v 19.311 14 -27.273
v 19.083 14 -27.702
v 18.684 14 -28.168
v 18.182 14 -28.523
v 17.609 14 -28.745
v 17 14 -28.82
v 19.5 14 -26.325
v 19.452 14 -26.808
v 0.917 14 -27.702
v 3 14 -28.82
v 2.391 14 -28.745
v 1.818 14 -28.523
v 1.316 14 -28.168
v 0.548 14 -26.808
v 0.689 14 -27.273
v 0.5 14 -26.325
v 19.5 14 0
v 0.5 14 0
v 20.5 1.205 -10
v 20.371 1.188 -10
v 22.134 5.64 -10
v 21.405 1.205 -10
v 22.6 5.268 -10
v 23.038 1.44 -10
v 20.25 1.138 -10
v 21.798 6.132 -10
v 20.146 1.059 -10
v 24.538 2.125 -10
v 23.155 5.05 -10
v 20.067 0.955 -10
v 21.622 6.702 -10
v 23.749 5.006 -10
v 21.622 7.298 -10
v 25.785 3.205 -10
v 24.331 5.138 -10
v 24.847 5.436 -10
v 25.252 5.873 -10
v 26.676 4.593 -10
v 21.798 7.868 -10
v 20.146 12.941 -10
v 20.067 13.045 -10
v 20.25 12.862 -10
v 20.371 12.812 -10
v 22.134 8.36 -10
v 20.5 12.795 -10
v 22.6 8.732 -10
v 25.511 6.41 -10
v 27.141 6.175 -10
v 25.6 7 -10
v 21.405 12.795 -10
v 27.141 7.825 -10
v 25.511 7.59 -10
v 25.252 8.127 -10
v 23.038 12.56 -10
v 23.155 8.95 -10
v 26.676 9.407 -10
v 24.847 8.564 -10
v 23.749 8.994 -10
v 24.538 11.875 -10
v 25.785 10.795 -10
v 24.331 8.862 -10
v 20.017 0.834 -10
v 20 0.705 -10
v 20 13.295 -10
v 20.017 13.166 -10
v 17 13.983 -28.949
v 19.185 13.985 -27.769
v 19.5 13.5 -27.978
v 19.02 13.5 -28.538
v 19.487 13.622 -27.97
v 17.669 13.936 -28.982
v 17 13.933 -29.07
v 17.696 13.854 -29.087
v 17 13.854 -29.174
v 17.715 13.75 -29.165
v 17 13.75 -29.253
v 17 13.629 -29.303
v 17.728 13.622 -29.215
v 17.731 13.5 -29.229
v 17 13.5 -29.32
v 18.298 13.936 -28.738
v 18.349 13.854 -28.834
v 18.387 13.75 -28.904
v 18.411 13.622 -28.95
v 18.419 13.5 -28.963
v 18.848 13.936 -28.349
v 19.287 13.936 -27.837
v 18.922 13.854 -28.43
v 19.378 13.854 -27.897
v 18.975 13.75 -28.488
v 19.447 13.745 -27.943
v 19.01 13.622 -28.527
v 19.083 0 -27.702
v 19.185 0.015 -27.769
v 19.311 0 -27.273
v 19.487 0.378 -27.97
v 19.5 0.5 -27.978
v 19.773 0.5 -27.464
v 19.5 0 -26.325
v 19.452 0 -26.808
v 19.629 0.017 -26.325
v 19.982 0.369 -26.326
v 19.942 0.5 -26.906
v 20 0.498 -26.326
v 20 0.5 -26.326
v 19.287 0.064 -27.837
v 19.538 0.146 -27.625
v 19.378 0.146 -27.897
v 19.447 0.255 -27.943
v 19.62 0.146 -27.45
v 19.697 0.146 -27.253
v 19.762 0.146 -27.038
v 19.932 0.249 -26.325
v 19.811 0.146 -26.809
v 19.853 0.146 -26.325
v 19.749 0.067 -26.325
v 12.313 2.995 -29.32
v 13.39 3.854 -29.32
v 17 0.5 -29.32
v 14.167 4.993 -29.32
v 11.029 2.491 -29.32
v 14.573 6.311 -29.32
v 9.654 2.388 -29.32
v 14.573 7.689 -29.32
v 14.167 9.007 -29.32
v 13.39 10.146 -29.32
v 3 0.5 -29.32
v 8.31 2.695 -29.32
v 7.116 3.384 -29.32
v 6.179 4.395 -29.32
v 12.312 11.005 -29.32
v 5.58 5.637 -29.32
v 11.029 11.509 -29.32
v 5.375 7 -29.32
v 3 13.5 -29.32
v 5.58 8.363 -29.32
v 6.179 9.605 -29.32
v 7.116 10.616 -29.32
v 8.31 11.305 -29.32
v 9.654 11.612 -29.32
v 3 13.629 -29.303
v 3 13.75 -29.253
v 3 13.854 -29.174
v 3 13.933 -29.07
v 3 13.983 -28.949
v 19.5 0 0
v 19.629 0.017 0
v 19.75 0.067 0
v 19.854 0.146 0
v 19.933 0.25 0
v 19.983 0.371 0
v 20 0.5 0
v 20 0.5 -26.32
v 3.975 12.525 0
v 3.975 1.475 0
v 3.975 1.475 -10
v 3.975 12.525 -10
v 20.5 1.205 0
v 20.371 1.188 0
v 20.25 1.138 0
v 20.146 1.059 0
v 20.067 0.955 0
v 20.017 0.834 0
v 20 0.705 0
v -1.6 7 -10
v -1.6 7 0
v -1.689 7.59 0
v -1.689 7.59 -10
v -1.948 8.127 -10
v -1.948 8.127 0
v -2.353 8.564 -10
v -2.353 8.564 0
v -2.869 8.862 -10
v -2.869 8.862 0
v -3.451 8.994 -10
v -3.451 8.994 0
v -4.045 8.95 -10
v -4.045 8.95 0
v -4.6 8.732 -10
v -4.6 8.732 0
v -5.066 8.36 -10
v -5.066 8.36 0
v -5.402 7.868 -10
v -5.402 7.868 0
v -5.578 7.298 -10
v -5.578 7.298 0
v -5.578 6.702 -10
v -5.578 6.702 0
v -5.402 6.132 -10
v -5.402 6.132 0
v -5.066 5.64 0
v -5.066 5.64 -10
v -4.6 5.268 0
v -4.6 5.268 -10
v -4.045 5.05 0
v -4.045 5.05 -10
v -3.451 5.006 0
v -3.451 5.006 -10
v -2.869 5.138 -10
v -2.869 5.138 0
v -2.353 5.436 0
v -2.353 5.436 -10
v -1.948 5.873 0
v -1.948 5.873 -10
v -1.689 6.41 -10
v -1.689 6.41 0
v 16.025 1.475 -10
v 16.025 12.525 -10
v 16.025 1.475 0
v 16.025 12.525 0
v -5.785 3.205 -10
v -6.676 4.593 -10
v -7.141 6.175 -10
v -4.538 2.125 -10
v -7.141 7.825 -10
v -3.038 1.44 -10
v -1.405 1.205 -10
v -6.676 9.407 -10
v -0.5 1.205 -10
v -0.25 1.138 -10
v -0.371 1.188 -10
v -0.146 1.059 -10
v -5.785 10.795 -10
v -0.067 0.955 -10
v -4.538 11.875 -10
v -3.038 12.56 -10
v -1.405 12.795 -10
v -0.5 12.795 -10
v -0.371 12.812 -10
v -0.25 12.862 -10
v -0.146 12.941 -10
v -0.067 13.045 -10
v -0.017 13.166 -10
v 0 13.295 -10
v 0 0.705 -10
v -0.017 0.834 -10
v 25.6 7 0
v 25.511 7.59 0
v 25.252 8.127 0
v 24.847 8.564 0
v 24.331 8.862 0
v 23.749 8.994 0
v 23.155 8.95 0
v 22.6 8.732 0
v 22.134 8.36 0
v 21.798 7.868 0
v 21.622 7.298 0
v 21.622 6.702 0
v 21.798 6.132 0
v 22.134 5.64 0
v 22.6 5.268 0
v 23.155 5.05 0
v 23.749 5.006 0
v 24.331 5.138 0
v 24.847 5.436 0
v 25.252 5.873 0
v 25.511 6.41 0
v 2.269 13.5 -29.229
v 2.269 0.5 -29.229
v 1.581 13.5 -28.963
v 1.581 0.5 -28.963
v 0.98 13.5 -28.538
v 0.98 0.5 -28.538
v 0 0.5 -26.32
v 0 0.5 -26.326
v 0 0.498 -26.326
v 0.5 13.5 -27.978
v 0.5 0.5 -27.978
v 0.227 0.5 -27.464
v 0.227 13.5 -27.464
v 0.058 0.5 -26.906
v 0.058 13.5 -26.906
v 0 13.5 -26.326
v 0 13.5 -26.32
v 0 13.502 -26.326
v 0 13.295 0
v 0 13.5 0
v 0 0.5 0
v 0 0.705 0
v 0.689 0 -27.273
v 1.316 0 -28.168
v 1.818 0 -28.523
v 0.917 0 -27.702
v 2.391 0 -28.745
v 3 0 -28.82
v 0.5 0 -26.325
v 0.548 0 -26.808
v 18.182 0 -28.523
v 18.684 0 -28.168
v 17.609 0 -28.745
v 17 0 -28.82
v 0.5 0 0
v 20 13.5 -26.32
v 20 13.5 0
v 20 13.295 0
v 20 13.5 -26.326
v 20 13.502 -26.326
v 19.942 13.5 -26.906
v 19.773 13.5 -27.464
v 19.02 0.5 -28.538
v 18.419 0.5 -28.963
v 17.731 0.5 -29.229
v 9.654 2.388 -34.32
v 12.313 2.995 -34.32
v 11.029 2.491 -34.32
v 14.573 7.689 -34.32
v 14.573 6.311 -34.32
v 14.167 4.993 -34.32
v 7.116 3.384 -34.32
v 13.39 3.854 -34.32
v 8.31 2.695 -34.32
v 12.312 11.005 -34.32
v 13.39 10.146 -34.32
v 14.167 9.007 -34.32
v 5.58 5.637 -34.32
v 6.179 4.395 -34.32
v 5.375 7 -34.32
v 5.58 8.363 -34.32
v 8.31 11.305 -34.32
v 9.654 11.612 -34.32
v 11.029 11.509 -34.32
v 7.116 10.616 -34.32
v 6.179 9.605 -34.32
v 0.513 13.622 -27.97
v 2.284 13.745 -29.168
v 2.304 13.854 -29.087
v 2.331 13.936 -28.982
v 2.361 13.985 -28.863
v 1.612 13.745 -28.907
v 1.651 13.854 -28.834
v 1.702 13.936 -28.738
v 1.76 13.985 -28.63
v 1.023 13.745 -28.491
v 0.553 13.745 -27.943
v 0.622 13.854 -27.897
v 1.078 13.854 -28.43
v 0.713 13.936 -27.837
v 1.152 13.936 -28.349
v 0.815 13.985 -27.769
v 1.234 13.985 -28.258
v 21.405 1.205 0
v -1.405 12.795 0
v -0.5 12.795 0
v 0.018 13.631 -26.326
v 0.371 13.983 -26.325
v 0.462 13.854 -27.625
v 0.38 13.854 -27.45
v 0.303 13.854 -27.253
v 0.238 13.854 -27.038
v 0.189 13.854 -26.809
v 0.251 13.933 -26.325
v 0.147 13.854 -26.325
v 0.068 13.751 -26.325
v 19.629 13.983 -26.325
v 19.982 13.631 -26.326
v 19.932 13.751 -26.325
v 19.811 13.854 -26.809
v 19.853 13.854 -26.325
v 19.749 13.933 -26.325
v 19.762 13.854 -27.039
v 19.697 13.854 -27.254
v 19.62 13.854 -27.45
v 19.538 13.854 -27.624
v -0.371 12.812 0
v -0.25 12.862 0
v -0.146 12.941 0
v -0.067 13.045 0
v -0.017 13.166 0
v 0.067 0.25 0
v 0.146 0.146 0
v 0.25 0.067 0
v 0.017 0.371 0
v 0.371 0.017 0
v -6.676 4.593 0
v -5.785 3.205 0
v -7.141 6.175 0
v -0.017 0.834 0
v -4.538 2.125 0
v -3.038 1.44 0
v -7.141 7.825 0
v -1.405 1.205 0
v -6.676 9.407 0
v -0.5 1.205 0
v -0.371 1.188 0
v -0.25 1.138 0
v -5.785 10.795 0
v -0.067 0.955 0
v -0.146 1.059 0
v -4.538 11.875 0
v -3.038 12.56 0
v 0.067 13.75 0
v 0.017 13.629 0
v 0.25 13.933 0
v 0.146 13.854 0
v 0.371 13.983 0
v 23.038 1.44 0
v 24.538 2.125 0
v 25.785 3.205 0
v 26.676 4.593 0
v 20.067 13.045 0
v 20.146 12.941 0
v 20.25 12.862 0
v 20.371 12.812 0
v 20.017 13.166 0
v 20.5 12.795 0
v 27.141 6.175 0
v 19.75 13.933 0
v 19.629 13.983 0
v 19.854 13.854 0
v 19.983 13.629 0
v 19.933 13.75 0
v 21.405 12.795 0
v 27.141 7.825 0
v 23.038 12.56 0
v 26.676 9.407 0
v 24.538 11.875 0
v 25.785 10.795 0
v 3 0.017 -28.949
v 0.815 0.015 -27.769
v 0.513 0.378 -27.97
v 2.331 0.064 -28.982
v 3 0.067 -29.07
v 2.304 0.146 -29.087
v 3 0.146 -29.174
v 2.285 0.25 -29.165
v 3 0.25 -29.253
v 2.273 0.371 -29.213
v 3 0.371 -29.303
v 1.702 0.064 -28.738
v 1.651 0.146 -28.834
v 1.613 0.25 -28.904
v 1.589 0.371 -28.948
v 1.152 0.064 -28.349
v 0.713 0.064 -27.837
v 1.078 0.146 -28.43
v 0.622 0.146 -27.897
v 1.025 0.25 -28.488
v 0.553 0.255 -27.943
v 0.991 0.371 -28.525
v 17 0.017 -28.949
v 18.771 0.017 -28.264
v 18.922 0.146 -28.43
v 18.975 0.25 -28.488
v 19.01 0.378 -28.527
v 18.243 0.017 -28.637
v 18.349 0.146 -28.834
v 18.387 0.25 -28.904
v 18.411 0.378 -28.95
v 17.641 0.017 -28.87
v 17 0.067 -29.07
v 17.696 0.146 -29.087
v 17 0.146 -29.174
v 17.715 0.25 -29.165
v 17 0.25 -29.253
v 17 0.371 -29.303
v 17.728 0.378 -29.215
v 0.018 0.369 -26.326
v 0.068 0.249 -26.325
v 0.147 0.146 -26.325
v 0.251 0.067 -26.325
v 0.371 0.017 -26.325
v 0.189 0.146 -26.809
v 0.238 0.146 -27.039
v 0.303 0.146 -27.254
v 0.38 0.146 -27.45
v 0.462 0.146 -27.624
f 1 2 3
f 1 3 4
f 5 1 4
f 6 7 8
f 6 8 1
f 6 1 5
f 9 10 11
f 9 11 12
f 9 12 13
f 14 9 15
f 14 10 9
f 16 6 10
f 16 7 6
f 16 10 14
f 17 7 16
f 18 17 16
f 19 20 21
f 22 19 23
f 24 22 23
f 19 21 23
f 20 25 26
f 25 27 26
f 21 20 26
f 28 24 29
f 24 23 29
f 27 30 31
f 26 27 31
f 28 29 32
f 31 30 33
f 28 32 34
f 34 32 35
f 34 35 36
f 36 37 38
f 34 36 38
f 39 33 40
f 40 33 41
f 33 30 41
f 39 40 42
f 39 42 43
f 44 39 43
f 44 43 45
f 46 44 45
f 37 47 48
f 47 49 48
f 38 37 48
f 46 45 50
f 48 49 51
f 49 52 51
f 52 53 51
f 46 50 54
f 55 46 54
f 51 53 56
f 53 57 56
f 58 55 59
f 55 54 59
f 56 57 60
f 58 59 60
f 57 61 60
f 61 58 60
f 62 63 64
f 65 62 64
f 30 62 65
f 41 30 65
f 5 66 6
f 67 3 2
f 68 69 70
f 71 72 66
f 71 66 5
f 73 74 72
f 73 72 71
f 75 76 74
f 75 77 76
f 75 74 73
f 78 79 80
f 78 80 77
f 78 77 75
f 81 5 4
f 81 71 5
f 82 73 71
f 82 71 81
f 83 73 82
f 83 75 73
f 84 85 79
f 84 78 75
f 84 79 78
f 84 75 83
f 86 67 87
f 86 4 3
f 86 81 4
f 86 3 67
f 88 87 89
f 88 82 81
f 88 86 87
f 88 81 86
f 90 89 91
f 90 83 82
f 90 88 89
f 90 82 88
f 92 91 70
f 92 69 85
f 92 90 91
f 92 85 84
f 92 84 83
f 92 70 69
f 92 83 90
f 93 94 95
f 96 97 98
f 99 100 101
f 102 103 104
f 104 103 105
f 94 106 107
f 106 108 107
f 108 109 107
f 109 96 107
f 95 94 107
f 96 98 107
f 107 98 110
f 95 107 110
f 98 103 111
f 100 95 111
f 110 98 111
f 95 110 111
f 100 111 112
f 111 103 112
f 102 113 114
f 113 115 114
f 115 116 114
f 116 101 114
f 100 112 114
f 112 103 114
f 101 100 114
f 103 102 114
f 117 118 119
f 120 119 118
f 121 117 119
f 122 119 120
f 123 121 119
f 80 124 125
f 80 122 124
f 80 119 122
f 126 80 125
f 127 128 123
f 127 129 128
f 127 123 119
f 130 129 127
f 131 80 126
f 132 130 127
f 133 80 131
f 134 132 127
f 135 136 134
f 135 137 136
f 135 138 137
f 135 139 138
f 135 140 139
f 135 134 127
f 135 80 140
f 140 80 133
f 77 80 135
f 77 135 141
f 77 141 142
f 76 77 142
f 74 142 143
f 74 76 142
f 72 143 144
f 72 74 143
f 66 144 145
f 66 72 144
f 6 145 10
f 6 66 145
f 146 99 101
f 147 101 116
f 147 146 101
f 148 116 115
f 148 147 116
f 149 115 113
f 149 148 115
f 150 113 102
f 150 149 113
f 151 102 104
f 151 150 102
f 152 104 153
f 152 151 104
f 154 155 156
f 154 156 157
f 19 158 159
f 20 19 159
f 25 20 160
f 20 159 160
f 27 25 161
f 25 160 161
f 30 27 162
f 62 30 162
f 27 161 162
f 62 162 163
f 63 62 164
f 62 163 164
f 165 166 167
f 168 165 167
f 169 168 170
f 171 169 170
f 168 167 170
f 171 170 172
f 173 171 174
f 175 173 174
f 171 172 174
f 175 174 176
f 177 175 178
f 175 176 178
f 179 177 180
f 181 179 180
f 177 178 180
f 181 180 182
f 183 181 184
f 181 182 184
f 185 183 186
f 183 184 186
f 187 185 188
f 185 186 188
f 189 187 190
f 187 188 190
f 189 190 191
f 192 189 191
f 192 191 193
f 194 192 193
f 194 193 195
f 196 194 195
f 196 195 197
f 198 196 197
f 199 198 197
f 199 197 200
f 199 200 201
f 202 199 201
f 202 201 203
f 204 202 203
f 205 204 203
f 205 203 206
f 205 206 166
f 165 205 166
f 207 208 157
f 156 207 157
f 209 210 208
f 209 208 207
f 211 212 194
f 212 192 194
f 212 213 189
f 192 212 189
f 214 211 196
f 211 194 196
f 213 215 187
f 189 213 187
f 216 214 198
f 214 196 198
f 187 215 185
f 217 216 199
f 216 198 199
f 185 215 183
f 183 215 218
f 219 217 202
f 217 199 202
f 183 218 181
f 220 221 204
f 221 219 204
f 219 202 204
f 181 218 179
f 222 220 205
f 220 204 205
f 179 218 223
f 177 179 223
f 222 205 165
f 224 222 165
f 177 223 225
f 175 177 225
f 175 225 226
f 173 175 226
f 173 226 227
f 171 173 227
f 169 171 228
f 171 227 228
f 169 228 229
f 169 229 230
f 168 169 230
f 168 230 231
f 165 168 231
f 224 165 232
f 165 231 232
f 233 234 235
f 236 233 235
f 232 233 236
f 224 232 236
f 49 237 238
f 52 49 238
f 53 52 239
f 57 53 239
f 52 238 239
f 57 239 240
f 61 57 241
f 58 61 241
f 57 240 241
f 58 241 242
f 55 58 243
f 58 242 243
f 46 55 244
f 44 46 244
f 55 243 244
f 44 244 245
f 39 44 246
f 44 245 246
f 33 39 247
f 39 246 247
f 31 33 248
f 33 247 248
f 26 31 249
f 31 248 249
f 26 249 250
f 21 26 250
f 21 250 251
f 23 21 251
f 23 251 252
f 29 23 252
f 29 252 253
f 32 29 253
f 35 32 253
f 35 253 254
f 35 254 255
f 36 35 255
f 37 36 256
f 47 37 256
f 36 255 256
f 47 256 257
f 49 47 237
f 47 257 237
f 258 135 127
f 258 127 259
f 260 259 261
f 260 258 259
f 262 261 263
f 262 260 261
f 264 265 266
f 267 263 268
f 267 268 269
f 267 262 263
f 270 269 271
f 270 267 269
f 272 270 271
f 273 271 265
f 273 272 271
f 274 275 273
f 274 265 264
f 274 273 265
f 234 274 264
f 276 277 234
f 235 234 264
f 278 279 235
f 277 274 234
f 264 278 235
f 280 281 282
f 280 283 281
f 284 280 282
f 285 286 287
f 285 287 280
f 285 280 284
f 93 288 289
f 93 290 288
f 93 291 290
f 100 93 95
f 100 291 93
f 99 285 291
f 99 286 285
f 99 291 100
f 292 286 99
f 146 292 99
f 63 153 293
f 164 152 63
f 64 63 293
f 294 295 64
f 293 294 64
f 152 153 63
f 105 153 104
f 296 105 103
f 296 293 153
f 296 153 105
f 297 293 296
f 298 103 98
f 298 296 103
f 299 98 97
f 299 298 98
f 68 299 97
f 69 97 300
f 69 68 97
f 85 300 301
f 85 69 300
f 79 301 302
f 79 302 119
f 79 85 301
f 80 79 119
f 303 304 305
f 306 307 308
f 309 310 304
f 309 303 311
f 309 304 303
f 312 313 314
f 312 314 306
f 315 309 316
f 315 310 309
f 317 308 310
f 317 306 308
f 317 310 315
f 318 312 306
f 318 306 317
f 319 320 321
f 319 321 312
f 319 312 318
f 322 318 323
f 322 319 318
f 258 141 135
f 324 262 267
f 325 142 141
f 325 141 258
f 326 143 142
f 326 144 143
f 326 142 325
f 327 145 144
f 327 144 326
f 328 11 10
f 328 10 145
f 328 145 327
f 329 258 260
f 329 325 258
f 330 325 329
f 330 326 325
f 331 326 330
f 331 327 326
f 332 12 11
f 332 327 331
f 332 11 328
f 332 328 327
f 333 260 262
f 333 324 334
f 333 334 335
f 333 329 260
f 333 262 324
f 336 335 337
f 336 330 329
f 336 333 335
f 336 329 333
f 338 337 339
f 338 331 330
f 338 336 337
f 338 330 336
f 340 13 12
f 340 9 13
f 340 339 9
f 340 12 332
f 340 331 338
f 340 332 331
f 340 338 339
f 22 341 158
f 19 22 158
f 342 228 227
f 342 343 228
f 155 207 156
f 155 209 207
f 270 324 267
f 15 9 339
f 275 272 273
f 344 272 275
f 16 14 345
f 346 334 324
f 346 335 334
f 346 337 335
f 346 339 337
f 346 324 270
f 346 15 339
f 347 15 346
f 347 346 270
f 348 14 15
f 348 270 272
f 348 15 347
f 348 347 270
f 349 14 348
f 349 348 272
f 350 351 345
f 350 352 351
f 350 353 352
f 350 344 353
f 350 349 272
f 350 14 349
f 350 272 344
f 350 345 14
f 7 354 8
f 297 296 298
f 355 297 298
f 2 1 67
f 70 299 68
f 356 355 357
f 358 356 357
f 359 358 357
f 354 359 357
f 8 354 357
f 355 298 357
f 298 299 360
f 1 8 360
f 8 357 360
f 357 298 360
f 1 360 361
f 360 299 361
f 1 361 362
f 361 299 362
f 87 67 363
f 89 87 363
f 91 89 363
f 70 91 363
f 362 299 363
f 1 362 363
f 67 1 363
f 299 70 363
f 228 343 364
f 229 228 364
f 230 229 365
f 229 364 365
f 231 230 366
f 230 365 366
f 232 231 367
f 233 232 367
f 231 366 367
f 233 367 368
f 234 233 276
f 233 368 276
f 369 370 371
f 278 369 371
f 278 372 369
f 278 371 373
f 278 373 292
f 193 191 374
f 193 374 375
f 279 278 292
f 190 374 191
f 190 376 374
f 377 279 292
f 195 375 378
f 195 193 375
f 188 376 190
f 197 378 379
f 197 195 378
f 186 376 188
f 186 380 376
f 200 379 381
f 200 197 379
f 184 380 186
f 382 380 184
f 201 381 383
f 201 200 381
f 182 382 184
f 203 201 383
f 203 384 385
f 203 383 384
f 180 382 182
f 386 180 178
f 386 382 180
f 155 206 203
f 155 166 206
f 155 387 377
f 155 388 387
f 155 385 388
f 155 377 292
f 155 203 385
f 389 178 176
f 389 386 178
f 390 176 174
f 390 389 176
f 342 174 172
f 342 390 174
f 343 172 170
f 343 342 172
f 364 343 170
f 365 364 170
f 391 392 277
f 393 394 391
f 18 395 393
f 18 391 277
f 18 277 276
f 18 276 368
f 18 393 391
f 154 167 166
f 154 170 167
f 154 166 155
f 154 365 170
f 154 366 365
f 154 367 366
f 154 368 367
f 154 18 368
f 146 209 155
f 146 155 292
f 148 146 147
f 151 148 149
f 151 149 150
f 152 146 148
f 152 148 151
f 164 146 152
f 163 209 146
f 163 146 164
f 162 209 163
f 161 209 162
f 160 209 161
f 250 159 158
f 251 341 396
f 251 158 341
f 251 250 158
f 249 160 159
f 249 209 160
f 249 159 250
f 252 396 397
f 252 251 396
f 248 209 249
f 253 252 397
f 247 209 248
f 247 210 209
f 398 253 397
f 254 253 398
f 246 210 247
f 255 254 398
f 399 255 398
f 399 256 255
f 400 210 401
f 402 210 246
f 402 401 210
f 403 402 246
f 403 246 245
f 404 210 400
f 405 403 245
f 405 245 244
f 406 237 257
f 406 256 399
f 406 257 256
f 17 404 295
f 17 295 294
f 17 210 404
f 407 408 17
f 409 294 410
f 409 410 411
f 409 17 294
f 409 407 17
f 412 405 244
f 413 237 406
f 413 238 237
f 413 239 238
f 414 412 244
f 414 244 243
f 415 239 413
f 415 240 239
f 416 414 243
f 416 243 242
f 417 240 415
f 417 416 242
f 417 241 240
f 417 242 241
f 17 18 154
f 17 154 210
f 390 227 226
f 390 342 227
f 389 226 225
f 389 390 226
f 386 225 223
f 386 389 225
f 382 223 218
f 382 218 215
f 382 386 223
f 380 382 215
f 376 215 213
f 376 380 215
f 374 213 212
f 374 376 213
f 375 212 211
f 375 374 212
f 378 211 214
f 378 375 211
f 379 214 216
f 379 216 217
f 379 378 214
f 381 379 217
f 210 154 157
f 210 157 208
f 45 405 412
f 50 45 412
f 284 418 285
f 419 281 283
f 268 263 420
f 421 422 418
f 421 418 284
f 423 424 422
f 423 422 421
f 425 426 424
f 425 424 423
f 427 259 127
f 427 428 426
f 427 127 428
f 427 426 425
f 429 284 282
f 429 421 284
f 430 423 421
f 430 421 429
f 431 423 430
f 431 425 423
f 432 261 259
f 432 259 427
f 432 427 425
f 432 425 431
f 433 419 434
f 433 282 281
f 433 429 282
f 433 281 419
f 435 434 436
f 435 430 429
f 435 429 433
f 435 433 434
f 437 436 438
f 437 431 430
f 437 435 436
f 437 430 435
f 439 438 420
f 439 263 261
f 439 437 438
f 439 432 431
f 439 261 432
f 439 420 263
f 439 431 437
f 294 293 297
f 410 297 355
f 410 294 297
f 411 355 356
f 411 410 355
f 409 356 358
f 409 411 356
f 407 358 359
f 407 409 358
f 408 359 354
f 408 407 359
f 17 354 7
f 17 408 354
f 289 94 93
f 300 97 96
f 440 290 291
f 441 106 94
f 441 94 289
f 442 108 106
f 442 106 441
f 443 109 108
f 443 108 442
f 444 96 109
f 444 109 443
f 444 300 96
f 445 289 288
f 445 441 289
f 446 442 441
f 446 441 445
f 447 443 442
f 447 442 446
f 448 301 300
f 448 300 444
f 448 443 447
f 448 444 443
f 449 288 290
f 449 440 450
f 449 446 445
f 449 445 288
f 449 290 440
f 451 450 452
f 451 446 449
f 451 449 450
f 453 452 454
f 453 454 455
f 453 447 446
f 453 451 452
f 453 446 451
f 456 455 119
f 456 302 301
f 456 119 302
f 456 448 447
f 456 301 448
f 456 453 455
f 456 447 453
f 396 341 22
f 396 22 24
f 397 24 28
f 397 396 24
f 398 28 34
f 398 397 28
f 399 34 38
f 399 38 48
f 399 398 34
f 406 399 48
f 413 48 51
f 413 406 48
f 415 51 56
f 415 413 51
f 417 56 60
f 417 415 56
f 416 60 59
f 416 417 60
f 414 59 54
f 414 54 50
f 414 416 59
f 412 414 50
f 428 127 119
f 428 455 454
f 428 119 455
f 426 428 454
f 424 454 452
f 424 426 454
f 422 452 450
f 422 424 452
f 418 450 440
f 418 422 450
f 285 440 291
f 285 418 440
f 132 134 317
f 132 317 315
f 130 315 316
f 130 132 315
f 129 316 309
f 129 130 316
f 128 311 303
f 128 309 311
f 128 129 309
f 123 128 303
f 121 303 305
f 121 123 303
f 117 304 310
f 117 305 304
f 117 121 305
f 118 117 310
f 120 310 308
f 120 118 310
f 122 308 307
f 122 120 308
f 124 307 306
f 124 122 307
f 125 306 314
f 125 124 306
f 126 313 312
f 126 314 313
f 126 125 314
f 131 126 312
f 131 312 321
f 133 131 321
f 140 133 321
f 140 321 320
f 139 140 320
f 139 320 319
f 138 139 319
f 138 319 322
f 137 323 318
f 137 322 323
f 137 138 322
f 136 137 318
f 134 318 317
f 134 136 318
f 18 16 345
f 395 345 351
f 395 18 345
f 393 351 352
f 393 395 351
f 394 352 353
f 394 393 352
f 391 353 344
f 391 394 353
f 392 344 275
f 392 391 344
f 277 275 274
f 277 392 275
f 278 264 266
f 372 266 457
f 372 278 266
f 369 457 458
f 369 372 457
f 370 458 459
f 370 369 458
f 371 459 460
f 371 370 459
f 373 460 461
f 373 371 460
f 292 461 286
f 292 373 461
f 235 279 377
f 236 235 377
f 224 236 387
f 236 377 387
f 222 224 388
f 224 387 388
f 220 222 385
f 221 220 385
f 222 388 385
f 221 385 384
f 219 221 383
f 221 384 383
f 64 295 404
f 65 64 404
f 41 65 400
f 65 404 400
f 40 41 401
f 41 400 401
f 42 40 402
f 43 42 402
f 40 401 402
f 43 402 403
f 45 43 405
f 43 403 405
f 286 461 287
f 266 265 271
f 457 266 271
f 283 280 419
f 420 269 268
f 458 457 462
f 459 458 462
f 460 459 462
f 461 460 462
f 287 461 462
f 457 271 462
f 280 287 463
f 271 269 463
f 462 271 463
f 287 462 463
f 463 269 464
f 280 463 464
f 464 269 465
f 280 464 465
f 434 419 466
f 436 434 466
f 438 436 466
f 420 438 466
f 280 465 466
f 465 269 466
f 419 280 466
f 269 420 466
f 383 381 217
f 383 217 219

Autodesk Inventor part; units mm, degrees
ref_plane "YZ Plane" through (0, 0, 0) normal (1, 0, 0) x (0, 1, 0)
ref_plane "XZ Plane" through (0, 0, 0) normal (0, 1, 0) x (-1, 0, 0)
ref_plane "XY Plane" through (0, 0, 0) normal (0, 0, 1) x (1, 0, 0)
sketch "Sketch1" plane through (0, 0, 0) normal (0, 0, 1) x (1, 0, 0)
  line L0 (0.5, 0) -> (19.5, 0)
  line L1 (19.5, 14) -> (0.5, 14)
  line L2 (-0.5, 12.795) -> (-1.405, 12.795)
  line L3 (-1.405, 1.205) -> (-0.5, 1.205)
  line L4 (20.5, 12.795) -> (21.405, 12.795)
  line L5 (21.405, 1.205) -> (20.5, 1.205)
  line L6 (0, 13.5) -> (0, 13.295)
  line L7 (0, 0.705) -> (0, 0.5)
  line L8 (20, 0.5) -> (20, 0.705)
  line L9 (20, 13.295) -> (20, 13.5)
  circle A0 centre (-3.6, 7) radius 2
  circle A1 centre (23.6, 7) radius 2
  line L10 (3.975, 12.525) -> (16.025, 12.525)
  line L11 (16.025, 12.525) -> (16.025, 1.475)
  line L12 (16.025, 1.475) -> (3.975, 1.475)
  line L13 (3.975, 1.475) -> (3.975, 12.525)
  arc A2 (0.5, 14) -> (0, 13.5) centre (0.5, 13.5) ccw
  arc A3 (-0.5, 12.795) -> (0, 13.295) centre (-0.5, 13.295) ccw
  arc A4 (20, 13.5) -> (19.5, 14) centre (19.5, 13.5) ccw
  arc A5 (20, 13.295) -> (20.5, 12.795) centre (20.5, 13.295) ccw
  arc A6 (20.5, 1.205) -> (20, 0.705) centre (20.5, 0.705) ccw
  arc A7 (19.5, 0) -> (20, 0.5) centre (19.5, 0.5) ccw
  arc A8 (0, 0.5) -> (0.5, 0) centre (0.5, 0.5) ccw
  arc A9 (0, 0.705) -> (-0.5, 1.205) centre (-0.5, 0.705) ccw
  line L14 (10, 15.3107) -> (10, 19.4603)
  arc A10 (-1.405, 12.795) -> (-1.405, 1.205) centre (-1.405, 7) ccw
  arc A11 (21.405, 1.205) -> (21.405, 12.795) centre (21.405, 7) ccw
  line L15 (-7.2, 7) -> (-7.2, 15.3107)
  point P0 (0, 0)
  point P1 (20, 14)
  point P2 (20, 0)
  point P3 (0, 14)
  point P4 (0, 12.795)
  point P5 (0, 1.205)
  point P6 (20, 12.795)
  point P7 (20, 1.205)
  dimension "d0" = 11.59
  dimension "d1" = 1.205
  dimension "d2" = 4
  dimension "width" = 20
  dimension "height" = 14
  dimension "d7" = 12.05
  dimension "d8" = 11.05
  dimension "d9" = 3.975
  dimension "d10" = 1.475
  dimension "d13" = 0.5
  dimension "d31" = 27.2
  dimension "d32" = 13.6
  dimension "d33" = 10
  dimension "d34" = 34.4
  dimension "d35" = 17.2
extrude "Extrusion1" add sketch "Sketch1" against normal blind 10
sketch "Sketch3" plane through (0, 0, -10) normal (0, 0, -1) x (-1, 0, 0)
  line L0 (-19.5, 14) -> (-0.5, 14)
  line L1 (0, 13.5) -> (0, 0.5)
  line L2 (-0.5, 0) -> (-19.5, 0)
  line L3 (-20, 0.5) -> (-20, 13.5)
  line L4 (-0.5, 0) -> (-19.5, 0) projected
  line L5 (0, 0.5) -> (0, 0.705) projected
  arc A0 (0, 13.5) -> (-0.5, 14) centre (-0.5, 13.5) ccw
  arc A1 (-0.5, 0) -> (0, 0.5) centre (-0.5, 0.5) ccw
  arc A2 (-20, 0.5) -> (-19.5, 0) centre (-19.5, 0.5) ccw
  arc A3 (-19.5, 14) -> (-20, 13.5) centre (-19.5, 13.5) ccw
  point P0 (0, 0)
  point P1 (-20, 14)
  point P2 (0, 0)
  point P3 (0, 14)
  point P4 (-20, 0)
  dimension "d14" = 20
  dimension "d15" = 14
  dimension "d16" = 0
  dimension "d17" = 0
  dimension "d20" = 0.5
extrude "Extrusion2" add sketch "Sketch3" along normal blind 19.32
sketch "Sketch6" plane through (0.5, 14, 0) normal (0, 1, 0) x (1, 0, 0)
  line L0 (-0.5, 0) -> (-0.5, 29.32) projected
  line L1 (-0.5, 29.32) -> (-0.5, 26.32)
  line L2 (-0.5, 29.32) -> (2.5, 29.32)
  arc A0 (2.5, 29.32) -> (-0.5, 26.32) centre (2.5, 26.32) ccw
  line L3 (19.5, 0) -> (19.5, 29.32) projected
  line L4 (19.5, 29.32) -> (19.5, 26.32)
  line L5 (19.5, 29.32) -> (16.5, 29.32)
  line L6 (0, 29.32) -> (19, 29.32) projected
  arc A1 (19.5, 26.32) -> (16.5, 29.32) centre (16.5, 26.32) ccw
  dimension "d36" = 3
extrude "Extrusion4" cut sketch "Sketch6" against normal through all
fillet "Fillet2" radius 0.5 10 edges at (18.4186, 14, -28.9634) (19.8751, 13.8307, -27.1768) (1.5814, 14, -28.9634) (0.1247, 13.8304, -27.176) (10, 14, -29.32) (1.5814, 0, -28.9634) (0.1249, 0.1694, -27.1767) (18.4186, 0, -28.9634) (19.8753, 0.1696, -27.176) (10, 0, -29.32)
sketch "Sketch7" plane through (0, 0, -29.32) normal (0, 0, -1) x (-1, 0, 0)
  circle A0 centre (-10, 7) radius 4.625
  line L0 (-3, 14) -> (-17, 14) projected
  line L1 (-20, 0.5) -> (-20, 13.5) projected
  point P0 (0, 0)
  dimension "d40" = 9.25
  dimension "d41" = 7
  dimension "d42" = 10
extrude "Extrusion5" add sketch "Sketch7" along normal blind 5
equation "\"d1\" = -0.5 * d0 + 0.5 * height"
equation "\"d9\" = -0.5 * d7 + 0.5 * width"
equation "\"d10\" = -0.5 * d8 + 0.5 * height"
equation "\"d32\" = 0.5 * d31"
equation "\"d33\" = 0.5 * width"
equation "\"d35\" = 0.5 * d34"
equation "\"d16\" = -0.5 * d15 + 0.5 * height"
equation "\"d17\" = -0.5 * d14 + 0.5 * width"
equation "\"d41\" = 0.5 * height"
equation "\"d42\" = 0.5 * width"
properties part number "panel-mount"
